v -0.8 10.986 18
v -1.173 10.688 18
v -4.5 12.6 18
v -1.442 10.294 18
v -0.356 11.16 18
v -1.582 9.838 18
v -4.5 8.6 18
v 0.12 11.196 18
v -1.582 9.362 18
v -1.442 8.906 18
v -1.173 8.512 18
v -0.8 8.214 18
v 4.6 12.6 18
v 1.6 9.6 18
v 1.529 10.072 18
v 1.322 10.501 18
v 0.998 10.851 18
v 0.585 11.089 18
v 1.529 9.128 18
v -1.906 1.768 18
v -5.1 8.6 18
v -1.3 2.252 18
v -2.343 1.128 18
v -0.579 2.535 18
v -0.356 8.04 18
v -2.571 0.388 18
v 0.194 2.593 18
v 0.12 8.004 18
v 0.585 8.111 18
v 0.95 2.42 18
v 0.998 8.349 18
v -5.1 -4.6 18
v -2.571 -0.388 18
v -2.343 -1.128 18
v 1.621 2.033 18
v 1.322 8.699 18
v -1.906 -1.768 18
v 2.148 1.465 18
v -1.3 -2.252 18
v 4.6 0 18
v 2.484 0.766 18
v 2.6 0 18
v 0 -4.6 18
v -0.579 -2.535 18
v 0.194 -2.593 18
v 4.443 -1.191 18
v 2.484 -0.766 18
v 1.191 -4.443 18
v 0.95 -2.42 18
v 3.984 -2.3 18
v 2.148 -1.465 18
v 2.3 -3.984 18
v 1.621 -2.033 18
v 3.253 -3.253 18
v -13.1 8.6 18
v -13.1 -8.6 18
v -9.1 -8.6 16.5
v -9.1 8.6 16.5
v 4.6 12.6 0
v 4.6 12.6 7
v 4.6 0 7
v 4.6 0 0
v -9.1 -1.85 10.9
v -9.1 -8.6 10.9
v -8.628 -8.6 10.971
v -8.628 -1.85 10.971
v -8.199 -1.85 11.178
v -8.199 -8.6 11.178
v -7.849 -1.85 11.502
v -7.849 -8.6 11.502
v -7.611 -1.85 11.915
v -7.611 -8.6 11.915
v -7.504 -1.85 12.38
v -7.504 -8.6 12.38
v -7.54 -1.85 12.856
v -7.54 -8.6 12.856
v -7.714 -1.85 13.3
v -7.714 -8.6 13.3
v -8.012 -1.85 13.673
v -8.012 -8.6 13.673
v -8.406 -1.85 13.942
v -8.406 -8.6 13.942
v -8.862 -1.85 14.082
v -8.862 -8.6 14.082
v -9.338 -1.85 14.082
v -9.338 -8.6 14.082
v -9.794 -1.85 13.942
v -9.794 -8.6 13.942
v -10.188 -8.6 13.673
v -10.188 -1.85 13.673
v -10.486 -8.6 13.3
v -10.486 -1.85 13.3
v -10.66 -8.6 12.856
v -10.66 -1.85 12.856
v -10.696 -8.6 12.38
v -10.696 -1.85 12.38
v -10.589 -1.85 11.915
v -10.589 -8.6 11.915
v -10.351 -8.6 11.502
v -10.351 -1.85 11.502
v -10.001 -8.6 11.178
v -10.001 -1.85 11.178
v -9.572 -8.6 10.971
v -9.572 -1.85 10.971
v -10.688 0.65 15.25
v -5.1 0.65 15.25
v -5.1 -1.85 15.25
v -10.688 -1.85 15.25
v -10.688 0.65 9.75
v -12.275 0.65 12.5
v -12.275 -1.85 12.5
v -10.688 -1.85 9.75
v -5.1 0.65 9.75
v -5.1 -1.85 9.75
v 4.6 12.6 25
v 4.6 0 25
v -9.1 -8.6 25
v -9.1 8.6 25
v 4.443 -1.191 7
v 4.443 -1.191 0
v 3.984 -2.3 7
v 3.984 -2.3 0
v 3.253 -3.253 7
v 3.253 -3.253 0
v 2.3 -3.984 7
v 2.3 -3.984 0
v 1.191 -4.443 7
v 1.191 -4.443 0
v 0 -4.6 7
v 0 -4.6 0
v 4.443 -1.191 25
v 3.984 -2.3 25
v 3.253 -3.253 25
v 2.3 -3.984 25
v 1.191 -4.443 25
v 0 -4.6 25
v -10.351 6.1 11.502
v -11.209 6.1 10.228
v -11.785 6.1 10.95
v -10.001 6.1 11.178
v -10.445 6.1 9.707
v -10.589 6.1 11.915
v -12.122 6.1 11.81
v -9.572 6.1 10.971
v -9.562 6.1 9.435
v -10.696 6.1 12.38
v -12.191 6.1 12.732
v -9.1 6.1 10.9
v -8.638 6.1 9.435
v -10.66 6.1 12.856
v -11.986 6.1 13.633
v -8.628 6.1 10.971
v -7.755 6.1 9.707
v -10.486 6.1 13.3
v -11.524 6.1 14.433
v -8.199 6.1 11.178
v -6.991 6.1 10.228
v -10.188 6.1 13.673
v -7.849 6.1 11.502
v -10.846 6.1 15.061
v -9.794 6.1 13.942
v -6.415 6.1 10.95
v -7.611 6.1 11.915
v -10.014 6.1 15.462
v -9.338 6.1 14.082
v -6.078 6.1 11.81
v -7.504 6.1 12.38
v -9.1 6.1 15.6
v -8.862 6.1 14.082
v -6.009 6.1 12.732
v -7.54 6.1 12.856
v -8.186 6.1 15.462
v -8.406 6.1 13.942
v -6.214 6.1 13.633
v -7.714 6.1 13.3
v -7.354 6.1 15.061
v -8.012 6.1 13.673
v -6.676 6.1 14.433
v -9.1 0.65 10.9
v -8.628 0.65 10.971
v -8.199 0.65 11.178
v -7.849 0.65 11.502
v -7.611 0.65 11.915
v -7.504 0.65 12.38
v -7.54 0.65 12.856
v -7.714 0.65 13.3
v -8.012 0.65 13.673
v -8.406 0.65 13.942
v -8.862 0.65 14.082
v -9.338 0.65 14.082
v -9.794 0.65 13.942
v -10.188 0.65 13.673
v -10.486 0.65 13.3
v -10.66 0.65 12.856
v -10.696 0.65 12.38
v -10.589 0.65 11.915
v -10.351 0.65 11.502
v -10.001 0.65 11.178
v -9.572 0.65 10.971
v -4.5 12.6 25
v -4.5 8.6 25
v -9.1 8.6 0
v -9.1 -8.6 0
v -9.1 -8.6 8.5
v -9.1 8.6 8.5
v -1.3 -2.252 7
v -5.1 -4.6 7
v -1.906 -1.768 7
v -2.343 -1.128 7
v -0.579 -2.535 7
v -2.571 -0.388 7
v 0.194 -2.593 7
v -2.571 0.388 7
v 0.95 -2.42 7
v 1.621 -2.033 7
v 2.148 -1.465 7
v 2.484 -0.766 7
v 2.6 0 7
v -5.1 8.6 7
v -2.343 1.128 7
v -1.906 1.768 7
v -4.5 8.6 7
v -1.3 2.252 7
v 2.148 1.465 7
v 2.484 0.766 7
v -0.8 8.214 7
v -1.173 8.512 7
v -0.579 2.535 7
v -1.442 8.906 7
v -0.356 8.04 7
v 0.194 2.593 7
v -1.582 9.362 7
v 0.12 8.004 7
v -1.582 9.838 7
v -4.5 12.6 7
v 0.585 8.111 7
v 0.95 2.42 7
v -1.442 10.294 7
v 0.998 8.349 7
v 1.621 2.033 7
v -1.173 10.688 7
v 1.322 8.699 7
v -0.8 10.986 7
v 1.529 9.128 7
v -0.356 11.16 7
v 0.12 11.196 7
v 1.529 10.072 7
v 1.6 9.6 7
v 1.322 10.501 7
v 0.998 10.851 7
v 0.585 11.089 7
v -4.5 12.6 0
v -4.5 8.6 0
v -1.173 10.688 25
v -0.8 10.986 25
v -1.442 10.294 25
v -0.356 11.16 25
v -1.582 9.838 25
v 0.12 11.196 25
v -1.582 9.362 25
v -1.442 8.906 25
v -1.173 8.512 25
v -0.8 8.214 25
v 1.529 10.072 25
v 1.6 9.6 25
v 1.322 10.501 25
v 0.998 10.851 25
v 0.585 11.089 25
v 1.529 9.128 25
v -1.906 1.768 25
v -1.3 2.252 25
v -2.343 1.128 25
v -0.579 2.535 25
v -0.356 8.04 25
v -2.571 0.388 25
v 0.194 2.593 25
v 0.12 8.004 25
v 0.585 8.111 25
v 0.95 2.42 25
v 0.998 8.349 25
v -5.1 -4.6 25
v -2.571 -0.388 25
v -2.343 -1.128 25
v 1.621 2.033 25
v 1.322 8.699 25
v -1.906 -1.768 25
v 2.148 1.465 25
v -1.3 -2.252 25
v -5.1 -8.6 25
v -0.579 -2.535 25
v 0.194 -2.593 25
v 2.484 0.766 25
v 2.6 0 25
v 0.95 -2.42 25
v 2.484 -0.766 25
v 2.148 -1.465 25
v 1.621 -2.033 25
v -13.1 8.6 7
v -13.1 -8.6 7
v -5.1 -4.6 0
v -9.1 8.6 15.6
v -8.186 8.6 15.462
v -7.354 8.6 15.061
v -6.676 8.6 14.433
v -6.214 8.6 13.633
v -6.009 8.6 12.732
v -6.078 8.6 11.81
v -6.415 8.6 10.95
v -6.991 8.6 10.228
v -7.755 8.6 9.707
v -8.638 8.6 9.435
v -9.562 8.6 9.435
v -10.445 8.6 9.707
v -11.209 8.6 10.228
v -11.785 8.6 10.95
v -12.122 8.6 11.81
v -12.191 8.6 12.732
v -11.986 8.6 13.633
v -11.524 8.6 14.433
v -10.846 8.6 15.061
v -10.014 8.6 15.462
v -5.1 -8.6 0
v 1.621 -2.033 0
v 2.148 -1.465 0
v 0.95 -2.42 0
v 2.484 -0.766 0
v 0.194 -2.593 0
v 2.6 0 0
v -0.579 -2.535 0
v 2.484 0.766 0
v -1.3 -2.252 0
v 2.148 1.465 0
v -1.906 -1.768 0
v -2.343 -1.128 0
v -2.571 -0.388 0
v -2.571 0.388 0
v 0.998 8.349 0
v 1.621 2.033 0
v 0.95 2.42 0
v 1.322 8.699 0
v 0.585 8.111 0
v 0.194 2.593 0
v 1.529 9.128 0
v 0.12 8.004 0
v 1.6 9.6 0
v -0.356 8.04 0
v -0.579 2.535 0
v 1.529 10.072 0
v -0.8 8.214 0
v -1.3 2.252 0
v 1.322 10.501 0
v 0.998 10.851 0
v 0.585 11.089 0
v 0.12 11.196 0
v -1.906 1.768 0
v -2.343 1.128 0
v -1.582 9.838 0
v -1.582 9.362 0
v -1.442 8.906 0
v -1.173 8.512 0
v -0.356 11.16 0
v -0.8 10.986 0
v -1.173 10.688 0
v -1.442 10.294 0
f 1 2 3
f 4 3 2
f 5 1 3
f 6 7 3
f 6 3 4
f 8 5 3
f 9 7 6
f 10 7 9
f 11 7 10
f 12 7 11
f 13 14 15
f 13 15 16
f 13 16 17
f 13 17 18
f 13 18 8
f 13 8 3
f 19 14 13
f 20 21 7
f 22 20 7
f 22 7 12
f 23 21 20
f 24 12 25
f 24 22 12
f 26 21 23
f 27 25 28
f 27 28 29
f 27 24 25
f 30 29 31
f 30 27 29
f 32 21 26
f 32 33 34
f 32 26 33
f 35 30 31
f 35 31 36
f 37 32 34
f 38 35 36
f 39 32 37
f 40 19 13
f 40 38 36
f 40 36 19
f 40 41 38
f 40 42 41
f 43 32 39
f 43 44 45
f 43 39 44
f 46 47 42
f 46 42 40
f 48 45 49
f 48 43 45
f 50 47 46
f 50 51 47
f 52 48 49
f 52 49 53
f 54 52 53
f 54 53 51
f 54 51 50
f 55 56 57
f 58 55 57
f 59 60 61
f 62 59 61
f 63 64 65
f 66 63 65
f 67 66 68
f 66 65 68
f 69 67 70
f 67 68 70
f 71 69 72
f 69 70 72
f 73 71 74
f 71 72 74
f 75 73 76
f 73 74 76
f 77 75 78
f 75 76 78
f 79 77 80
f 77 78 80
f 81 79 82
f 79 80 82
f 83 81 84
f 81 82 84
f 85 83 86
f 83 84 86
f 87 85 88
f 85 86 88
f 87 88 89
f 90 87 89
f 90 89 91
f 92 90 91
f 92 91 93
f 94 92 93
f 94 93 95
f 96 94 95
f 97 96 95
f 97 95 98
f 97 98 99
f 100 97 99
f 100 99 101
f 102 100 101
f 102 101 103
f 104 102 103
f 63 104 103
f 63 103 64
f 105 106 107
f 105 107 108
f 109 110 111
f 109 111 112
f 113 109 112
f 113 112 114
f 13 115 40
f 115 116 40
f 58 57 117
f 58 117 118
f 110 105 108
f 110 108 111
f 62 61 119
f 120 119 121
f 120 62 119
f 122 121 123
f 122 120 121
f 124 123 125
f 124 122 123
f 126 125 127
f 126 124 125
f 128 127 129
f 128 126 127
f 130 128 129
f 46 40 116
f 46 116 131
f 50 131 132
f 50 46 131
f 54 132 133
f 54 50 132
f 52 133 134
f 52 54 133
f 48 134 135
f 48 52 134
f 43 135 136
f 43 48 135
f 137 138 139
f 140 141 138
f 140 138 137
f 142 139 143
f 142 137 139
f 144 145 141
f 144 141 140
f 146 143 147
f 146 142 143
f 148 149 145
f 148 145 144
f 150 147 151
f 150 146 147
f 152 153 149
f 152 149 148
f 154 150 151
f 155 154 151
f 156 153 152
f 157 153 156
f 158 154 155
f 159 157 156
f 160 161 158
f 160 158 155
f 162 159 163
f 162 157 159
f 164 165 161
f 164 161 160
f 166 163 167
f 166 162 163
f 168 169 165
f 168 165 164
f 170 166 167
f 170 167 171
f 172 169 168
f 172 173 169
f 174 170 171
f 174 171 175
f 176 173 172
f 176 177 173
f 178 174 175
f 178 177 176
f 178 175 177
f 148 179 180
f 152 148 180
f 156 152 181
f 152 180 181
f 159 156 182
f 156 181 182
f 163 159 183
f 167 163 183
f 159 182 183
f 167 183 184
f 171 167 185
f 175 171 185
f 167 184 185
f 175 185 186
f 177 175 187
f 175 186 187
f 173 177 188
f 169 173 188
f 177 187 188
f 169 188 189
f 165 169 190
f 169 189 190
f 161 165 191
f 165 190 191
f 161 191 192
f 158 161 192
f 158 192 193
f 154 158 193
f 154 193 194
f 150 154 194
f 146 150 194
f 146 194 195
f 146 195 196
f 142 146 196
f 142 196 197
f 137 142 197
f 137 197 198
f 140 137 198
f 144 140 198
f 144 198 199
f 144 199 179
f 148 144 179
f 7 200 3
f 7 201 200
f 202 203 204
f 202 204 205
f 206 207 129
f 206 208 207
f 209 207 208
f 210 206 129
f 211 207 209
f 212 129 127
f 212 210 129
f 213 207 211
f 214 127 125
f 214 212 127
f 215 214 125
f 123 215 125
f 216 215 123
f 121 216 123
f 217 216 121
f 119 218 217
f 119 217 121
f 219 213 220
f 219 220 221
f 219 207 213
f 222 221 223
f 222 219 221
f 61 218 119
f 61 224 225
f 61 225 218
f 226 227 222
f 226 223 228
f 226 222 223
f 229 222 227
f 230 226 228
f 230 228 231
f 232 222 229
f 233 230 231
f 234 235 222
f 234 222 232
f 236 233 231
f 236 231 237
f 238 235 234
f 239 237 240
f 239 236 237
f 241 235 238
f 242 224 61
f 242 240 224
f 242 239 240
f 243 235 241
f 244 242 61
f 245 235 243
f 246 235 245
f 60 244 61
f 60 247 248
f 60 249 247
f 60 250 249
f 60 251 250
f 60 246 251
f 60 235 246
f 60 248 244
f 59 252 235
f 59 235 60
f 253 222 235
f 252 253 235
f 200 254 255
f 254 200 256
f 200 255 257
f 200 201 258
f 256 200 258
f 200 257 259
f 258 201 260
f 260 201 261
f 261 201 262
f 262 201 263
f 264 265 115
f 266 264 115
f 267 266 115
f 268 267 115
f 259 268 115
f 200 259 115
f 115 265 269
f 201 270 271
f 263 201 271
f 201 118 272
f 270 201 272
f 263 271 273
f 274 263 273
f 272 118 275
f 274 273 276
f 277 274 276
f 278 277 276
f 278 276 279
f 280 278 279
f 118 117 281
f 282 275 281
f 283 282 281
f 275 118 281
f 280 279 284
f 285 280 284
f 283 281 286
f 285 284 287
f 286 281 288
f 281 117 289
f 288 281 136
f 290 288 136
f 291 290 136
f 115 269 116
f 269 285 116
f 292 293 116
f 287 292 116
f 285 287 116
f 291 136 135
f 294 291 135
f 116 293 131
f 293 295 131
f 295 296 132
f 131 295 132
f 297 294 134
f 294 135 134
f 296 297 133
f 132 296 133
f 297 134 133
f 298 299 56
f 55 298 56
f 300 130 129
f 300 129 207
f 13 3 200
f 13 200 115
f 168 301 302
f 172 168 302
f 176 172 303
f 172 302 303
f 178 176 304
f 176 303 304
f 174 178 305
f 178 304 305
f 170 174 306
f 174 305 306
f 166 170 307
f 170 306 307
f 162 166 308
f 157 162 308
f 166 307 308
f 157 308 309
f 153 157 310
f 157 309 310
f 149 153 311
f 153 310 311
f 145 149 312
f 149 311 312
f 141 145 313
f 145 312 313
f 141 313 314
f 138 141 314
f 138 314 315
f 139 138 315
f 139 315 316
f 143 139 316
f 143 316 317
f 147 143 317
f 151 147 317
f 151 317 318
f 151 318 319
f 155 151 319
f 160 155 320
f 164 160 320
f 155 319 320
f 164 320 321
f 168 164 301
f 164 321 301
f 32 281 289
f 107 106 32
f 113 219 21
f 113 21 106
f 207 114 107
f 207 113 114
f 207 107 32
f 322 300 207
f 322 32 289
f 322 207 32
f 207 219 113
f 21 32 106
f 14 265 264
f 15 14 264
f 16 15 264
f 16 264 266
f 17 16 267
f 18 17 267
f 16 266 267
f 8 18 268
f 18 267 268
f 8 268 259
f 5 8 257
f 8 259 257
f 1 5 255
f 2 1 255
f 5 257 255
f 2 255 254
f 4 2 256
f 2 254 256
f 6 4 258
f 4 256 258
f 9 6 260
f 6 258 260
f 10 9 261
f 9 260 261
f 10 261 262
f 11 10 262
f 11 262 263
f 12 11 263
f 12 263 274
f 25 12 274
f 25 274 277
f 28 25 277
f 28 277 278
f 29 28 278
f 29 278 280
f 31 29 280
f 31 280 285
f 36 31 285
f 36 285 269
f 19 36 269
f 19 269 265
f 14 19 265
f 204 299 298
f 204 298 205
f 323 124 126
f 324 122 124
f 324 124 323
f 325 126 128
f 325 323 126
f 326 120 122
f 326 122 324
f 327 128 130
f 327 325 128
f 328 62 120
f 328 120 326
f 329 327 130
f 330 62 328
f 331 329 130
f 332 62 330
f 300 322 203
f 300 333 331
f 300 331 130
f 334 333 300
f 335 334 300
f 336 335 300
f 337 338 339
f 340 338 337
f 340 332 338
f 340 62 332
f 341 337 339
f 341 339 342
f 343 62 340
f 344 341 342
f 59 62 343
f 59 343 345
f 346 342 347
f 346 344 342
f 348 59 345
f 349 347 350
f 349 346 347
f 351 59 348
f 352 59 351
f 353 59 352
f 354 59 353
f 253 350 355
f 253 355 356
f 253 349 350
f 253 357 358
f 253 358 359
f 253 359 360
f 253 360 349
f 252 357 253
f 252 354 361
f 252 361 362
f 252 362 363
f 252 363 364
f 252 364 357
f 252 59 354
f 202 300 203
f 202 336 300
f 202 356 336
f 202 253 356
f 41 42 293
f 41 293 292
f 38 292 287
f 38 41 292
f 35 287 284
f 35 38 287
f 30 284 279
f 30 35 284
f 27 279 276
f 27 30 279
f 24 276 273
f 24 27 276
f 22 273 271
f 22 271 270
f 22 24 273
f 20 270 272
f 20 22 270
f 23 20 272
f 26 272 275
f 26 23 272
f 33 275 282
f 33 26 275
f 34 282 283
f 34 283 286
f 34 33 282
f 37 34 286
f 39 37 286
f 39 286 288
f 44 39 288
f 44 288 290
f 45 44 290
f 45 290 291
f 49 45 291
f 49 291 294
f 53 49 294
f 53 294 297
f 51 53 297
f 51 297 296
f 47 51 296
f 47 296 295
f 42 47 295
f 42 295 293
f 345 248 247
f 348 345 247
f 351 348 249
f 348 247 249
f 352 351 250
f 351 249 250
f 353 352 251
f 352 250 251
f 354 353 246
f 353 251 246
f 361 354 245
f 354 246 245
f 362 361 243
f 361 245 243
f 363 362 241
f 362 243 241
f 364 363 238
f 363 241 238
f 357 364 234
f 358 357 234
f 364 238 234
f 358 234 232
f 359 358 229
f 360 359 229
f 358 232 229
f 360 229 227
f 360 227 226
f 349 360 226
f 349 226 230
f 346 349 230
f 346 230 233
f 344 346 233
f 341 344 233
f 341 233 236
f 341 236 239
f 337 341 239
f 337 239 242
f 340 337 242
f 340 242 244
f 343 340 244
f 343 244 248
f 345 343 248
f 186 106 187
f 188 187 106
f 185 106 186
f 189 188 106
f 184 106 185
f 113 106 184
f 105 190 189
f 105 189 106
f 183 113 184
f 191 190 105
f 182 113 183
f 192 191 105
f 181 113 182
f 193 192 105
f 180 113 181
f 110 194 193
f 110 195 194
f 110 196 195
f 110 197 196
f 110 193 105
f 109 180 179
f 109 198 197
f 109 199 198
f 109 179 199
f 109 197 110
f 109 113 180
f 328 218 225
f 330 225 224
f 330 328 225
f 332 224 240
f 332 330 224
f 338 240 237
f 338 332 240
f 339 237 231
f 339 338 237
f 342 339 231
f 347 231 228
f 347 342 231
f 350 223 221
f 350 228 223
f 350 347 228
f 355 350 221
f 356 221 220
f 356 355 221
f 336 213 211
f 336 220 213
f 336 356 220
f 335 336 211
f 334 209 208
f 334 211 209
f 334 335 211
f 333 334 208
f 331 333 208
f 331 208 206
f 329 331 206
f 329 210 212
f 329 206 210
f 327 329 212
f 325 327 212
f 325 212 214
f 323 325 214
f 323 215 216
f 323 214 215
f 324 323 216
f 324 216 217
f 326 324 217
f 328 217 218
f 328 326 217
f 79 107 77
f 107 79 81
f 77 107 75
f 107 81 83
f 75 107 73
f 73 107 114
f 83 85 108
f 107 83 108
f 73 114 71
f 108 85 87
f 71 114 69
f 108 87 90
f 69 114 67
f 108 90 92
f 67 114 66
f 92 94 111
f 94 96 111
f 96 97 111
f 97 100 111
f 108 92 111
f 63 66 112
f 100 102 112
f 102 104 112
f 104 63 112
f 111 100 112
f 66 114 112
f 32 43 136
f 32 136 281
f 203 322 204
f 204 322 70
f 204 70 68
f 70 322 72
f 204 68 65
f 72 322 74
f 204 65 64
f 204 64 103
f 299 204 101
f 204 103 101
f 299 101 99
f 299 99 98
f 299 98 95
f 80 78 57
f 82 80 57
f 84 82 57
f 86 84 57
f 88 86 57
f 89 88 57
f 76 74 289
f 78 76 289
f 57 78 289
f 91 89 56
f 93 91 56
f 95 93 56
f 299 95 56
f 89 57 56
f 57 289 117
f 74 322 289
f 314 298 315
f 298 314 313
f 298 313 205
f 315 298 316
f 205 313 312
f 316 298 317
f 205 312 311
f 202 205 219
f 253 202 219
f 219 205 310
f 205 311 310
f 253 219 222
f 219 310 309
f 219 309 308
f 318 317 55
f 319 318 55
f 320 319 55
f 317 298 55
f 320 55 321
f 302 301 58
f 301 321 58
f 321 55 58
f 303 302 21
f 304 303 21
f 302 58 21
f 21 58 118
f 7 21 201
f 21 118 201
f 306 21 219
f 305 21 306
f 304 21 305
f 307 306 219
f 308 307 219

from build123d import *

# Parameters (mm, degrees)
CROQUIS1_R                 = 2.6
SALIENTE_EXTRUIR1_DEPTH    = 25
CROQUIS2_W                 = 9.7
CROQUIS2_H                 = 11
CORTAR_EXTRUIR1_DEPTH      = 25
CROQUIS3_W                 = 4
CROQUIS3_H                 = 8
SALIENTE_EXTRUIR2_DEPTH    = 17.2
CORTAR_EXTRUIR2_DEPTH      = 1.25
CORTAR_EXTRUIR2_DEPTH_BACK = 1.25
CROQUIS5_R                 = 1.6
CORTAR_EXTRUIR3_DEPTH      = 34.25
SALIENTE_EXTRUIR3_DEPTH    = 17.2
SALIENTE_EXTRUIR4_REACH    = 31.505
CORTAR_EXTRUIR4_DEPTH      = 27.25
CORTAR_EXTRUIR4_DEPTH_BACK = 27.25
CROQUIS13_W                = 9.7
CROQUIS13_H                = 11
CROQUIS15_R                = 1.6
CORTAR_EXTRUIR6_DEPTH      = 27.25
CROQUIS16_W                = 0.6
CROQUIS16_H                = 3
CORTAR_EXTRUIR7_DEPTH      = 33
CROQUIS17_R                = 3.1
CORTAR_EXTRUIR8_DEPTH      = 2.5
CROQUIS18_W                = 9.1
CROQUIS18_H                = 7
SALIENTE_EXTRUIR5_DEPTH    = 1


with BuildPart() as part:
    # Croquis1 → Saliente-Extruir1 (new body)
    with BuildSketch(Plane.XY):
        with BuildLine():
            Line((-9.1, 8.6), (-5.1, 8.6))
            Line((-5.1, 8.6), (-5.1, 4.6))
            Line((-5.1, 4.6), (0, 4.6))
            ThreePointArc((0, 4.6), (4.6, 0), (0, -4.6))
            Line((0, -4.6), (-5.1, -4.6))
            Line((-5.1, -4.6), (-5.1, -8.6))
            Line((-5.1, -8.6), (-9.1, -8.6))
            Line((-9.1, -8.6), (-9.1, 8.6))
        make_face()
        Circle(CROQUIS1_R, mode=Mode.SUBTRACT)
    extrude(amount=SALIENTE_EXTRUIR1_DEPTH)

    # Croquis2 → Cortar-Extruir1 (cut)
    with BuildSketch(Plane(origin=(0, 4.6, 0), x_dir=(1, 0, 0), z_dir=(0, 1, 0))):
        with Locations((-0.25, -12.5)):
            Rectangle(CROQUIS2_W, CROQUIS2_H)
    extrude(amount=-CORTAR_EXTRUIR1_DEPTH, mode=Mode.SUBTRACT)

    # Croquis3 → Saliente-Extruir2 (add)
    with BuildSketch(Plane(origin=(0, 8.6, 0), x_dir=(1, 0, 0), z_dir=(0, 1, 0))):
        with Locations((-11.1, -12.5)):
            Rectangle(CROQUIS3_W, CROQUIS3_H)
    extrude(amount=-SALIENTE_EXTRUIR2_DEPTH)

    # Croquis4 → Cortar-Extruir2 (cut, two sides: drawn at the far end of the back side and taken through both)
    with BuildSketch(Plane(origin=(0, -0.6, 0), x_dir=(-1, 0, 0), z_dir=(0, -1, 0)).offset(-CORTAR_EXTRUIR2_DEPTH_BACK)):
        Polygon((7.01228676, -9.75), (5.1, -9.75), (5.1, -15.25), (7.01228676, -15.25), (10.68771324, -15.25), (12.275426481, -12.5), (10.68771324, -9.75), align=None)
    extrude(amount=CORTAR_EXTRUIR2_DEPTH + CORTAR_EXTRUIR2_DEPTH_BACK, mode=Mode.SUBTRACT)

    # Croquis5 → Cortar-Extruir3 (cut)
    with BuildSketch(Plane.XZ.offset(8.6)):
        with Locations(Location((-9.1, 12.5, 0), (0, 0, 270))):
            Circle(CROQUIS5_R)
    extrude(amount=-CORTAR_EXTRUIR3_DEPTH, mode=Mode.SUBTRACT)

    # Croquis6 → Saliente-Extruir3 (add)
    with BuildSketch(Plane.XZ.offset(8.6)):
        Polygon((-13.1, 18), (-9.1, 16.5), (-13.1, 16.5), align=None)
        Polygon((-13.1, 8.5), (-13.1, 7), (-9.1, 8.5), align=None)
    extrude(amount=-SALIENTE_EXTRUIR3_DEPTH)

    # Saliente-Extruir4: up to this face of the body (flat: up to its plane)
    saliente_extruir4_end = Plane(part.part.faces().sort_by_distance((-4.253300765, 0, 0))[0])
    # Croquis12 → Saliente-Extruir4 (add, up to the picked face)
    with BuildSketch(Plane.XY.offset(25), mode=Mode.PRIVATE) as saliente_extruir4_sk1:
        with BuildLine():
            Line((1.9, 11.6), (4.6, 11.6))
            Line((4.6, 11.6), (4.6, 0))
            Line((4.6, 0), (4, 0))
            ThreePointArc((4, 0), (2.828427125, 2.828427125), (0, 4))
            Line((0, 4), (0, 4.6))
            Line((0, 4.6), (-5.1, 4.6))
            Line((-5.1, 4.6), (-5.1, 11.6))
            Line((-5.1, 11.6), (1.9, 11.6))
        make_face()
    saliente_extruir4_tool1 = split(extrude(saliente_extruir4_sk1.sketch, amount=-SALIENTE_EXTRUIR4_REACH, mode=Mode.PRIVATE), bisect_by=saliente_extruir4_end, keep=Keep.BOTH, mode=Mode.PRIVATE)
    add(saliente_extruir4_tool1.solids().sort_by(Axis((0.135432, 7.547356, 25), (0, 0, -1)))[0])

    # Croquis13 → Cortar-Extruir4 (cut, two sides: drawn at the far end of the back side and taken through both)
    with BuildSketch(Plane.XZ.offset(-4.6).offset(-CORTAR_EXTRUIR4_DEPTH_BACK)):
        with Locations((-0.25, 12.5)):
            Rectangle(CROQUIS13_W, CROQUIS13_H)
    extrude(amount=CORTAR_EXTRUIR4_DEPTH + CORTAR_EXTRUIR4_DEPTH_BACK, mode=Mode.SUBTRACT)

    # Croquis15 → Cortar-Extruir6 (cut)
    with BuildSketch(Plane.XY.offset(25)):
        with Locations((0, 9.6)):
            Circle(CROQUIS15_R)
    extrude(amount=-CORTAR_EXTRUIR6_DEPTH, mode=Mode.SUBTRACT)

    # Croquis16 → Cortar-Extruir7 (cut)
    with BuildSketch(Plane.XY.offset(25)):
        with Locations((-4.8, 10.1)):
            Rectangle(CROQUIS16_W, CROQUIS16_H)
    extrude(amount=-CORTAR_EXTRUIR7_DEPTH, mode=Mode.SUBTRACT)

    # Croquis17 → Cortar-Extruir8 (cut)
    with BuildSketch(Plane(origin=(0, 8.6, 0), x_dir=(1, 0, 0), z_dir=(0, 1, 0))):
        with Locations(Location((-9.1, -12.5, 0), (0, 0, 270))):
            Circle(CROQUIS17_R)
    extrude(amount=-CORTAR_EXTRUIR8_DEPTH, mode=Mode.SUBTRACT)

    # Croquis18 → Saliente-Extruir5 (add)
    with BuildSketch(Plane(origin=(0, 11.6, 0), x_dir=(1, 0, 0), z_dir=(0, 1, 0))):
        with Locations((0.05, -21.5)):
            Rectangle(CROQUIS18_W, CROQUIS18_H)
        with Locations((0.05, -3.5)):
            Rectangle(CROQUIS18_W, CROQUIS18_H)
    extrude(amount=SALIENTE_EXTRUIR5_DEPTH)


solid = part.part
